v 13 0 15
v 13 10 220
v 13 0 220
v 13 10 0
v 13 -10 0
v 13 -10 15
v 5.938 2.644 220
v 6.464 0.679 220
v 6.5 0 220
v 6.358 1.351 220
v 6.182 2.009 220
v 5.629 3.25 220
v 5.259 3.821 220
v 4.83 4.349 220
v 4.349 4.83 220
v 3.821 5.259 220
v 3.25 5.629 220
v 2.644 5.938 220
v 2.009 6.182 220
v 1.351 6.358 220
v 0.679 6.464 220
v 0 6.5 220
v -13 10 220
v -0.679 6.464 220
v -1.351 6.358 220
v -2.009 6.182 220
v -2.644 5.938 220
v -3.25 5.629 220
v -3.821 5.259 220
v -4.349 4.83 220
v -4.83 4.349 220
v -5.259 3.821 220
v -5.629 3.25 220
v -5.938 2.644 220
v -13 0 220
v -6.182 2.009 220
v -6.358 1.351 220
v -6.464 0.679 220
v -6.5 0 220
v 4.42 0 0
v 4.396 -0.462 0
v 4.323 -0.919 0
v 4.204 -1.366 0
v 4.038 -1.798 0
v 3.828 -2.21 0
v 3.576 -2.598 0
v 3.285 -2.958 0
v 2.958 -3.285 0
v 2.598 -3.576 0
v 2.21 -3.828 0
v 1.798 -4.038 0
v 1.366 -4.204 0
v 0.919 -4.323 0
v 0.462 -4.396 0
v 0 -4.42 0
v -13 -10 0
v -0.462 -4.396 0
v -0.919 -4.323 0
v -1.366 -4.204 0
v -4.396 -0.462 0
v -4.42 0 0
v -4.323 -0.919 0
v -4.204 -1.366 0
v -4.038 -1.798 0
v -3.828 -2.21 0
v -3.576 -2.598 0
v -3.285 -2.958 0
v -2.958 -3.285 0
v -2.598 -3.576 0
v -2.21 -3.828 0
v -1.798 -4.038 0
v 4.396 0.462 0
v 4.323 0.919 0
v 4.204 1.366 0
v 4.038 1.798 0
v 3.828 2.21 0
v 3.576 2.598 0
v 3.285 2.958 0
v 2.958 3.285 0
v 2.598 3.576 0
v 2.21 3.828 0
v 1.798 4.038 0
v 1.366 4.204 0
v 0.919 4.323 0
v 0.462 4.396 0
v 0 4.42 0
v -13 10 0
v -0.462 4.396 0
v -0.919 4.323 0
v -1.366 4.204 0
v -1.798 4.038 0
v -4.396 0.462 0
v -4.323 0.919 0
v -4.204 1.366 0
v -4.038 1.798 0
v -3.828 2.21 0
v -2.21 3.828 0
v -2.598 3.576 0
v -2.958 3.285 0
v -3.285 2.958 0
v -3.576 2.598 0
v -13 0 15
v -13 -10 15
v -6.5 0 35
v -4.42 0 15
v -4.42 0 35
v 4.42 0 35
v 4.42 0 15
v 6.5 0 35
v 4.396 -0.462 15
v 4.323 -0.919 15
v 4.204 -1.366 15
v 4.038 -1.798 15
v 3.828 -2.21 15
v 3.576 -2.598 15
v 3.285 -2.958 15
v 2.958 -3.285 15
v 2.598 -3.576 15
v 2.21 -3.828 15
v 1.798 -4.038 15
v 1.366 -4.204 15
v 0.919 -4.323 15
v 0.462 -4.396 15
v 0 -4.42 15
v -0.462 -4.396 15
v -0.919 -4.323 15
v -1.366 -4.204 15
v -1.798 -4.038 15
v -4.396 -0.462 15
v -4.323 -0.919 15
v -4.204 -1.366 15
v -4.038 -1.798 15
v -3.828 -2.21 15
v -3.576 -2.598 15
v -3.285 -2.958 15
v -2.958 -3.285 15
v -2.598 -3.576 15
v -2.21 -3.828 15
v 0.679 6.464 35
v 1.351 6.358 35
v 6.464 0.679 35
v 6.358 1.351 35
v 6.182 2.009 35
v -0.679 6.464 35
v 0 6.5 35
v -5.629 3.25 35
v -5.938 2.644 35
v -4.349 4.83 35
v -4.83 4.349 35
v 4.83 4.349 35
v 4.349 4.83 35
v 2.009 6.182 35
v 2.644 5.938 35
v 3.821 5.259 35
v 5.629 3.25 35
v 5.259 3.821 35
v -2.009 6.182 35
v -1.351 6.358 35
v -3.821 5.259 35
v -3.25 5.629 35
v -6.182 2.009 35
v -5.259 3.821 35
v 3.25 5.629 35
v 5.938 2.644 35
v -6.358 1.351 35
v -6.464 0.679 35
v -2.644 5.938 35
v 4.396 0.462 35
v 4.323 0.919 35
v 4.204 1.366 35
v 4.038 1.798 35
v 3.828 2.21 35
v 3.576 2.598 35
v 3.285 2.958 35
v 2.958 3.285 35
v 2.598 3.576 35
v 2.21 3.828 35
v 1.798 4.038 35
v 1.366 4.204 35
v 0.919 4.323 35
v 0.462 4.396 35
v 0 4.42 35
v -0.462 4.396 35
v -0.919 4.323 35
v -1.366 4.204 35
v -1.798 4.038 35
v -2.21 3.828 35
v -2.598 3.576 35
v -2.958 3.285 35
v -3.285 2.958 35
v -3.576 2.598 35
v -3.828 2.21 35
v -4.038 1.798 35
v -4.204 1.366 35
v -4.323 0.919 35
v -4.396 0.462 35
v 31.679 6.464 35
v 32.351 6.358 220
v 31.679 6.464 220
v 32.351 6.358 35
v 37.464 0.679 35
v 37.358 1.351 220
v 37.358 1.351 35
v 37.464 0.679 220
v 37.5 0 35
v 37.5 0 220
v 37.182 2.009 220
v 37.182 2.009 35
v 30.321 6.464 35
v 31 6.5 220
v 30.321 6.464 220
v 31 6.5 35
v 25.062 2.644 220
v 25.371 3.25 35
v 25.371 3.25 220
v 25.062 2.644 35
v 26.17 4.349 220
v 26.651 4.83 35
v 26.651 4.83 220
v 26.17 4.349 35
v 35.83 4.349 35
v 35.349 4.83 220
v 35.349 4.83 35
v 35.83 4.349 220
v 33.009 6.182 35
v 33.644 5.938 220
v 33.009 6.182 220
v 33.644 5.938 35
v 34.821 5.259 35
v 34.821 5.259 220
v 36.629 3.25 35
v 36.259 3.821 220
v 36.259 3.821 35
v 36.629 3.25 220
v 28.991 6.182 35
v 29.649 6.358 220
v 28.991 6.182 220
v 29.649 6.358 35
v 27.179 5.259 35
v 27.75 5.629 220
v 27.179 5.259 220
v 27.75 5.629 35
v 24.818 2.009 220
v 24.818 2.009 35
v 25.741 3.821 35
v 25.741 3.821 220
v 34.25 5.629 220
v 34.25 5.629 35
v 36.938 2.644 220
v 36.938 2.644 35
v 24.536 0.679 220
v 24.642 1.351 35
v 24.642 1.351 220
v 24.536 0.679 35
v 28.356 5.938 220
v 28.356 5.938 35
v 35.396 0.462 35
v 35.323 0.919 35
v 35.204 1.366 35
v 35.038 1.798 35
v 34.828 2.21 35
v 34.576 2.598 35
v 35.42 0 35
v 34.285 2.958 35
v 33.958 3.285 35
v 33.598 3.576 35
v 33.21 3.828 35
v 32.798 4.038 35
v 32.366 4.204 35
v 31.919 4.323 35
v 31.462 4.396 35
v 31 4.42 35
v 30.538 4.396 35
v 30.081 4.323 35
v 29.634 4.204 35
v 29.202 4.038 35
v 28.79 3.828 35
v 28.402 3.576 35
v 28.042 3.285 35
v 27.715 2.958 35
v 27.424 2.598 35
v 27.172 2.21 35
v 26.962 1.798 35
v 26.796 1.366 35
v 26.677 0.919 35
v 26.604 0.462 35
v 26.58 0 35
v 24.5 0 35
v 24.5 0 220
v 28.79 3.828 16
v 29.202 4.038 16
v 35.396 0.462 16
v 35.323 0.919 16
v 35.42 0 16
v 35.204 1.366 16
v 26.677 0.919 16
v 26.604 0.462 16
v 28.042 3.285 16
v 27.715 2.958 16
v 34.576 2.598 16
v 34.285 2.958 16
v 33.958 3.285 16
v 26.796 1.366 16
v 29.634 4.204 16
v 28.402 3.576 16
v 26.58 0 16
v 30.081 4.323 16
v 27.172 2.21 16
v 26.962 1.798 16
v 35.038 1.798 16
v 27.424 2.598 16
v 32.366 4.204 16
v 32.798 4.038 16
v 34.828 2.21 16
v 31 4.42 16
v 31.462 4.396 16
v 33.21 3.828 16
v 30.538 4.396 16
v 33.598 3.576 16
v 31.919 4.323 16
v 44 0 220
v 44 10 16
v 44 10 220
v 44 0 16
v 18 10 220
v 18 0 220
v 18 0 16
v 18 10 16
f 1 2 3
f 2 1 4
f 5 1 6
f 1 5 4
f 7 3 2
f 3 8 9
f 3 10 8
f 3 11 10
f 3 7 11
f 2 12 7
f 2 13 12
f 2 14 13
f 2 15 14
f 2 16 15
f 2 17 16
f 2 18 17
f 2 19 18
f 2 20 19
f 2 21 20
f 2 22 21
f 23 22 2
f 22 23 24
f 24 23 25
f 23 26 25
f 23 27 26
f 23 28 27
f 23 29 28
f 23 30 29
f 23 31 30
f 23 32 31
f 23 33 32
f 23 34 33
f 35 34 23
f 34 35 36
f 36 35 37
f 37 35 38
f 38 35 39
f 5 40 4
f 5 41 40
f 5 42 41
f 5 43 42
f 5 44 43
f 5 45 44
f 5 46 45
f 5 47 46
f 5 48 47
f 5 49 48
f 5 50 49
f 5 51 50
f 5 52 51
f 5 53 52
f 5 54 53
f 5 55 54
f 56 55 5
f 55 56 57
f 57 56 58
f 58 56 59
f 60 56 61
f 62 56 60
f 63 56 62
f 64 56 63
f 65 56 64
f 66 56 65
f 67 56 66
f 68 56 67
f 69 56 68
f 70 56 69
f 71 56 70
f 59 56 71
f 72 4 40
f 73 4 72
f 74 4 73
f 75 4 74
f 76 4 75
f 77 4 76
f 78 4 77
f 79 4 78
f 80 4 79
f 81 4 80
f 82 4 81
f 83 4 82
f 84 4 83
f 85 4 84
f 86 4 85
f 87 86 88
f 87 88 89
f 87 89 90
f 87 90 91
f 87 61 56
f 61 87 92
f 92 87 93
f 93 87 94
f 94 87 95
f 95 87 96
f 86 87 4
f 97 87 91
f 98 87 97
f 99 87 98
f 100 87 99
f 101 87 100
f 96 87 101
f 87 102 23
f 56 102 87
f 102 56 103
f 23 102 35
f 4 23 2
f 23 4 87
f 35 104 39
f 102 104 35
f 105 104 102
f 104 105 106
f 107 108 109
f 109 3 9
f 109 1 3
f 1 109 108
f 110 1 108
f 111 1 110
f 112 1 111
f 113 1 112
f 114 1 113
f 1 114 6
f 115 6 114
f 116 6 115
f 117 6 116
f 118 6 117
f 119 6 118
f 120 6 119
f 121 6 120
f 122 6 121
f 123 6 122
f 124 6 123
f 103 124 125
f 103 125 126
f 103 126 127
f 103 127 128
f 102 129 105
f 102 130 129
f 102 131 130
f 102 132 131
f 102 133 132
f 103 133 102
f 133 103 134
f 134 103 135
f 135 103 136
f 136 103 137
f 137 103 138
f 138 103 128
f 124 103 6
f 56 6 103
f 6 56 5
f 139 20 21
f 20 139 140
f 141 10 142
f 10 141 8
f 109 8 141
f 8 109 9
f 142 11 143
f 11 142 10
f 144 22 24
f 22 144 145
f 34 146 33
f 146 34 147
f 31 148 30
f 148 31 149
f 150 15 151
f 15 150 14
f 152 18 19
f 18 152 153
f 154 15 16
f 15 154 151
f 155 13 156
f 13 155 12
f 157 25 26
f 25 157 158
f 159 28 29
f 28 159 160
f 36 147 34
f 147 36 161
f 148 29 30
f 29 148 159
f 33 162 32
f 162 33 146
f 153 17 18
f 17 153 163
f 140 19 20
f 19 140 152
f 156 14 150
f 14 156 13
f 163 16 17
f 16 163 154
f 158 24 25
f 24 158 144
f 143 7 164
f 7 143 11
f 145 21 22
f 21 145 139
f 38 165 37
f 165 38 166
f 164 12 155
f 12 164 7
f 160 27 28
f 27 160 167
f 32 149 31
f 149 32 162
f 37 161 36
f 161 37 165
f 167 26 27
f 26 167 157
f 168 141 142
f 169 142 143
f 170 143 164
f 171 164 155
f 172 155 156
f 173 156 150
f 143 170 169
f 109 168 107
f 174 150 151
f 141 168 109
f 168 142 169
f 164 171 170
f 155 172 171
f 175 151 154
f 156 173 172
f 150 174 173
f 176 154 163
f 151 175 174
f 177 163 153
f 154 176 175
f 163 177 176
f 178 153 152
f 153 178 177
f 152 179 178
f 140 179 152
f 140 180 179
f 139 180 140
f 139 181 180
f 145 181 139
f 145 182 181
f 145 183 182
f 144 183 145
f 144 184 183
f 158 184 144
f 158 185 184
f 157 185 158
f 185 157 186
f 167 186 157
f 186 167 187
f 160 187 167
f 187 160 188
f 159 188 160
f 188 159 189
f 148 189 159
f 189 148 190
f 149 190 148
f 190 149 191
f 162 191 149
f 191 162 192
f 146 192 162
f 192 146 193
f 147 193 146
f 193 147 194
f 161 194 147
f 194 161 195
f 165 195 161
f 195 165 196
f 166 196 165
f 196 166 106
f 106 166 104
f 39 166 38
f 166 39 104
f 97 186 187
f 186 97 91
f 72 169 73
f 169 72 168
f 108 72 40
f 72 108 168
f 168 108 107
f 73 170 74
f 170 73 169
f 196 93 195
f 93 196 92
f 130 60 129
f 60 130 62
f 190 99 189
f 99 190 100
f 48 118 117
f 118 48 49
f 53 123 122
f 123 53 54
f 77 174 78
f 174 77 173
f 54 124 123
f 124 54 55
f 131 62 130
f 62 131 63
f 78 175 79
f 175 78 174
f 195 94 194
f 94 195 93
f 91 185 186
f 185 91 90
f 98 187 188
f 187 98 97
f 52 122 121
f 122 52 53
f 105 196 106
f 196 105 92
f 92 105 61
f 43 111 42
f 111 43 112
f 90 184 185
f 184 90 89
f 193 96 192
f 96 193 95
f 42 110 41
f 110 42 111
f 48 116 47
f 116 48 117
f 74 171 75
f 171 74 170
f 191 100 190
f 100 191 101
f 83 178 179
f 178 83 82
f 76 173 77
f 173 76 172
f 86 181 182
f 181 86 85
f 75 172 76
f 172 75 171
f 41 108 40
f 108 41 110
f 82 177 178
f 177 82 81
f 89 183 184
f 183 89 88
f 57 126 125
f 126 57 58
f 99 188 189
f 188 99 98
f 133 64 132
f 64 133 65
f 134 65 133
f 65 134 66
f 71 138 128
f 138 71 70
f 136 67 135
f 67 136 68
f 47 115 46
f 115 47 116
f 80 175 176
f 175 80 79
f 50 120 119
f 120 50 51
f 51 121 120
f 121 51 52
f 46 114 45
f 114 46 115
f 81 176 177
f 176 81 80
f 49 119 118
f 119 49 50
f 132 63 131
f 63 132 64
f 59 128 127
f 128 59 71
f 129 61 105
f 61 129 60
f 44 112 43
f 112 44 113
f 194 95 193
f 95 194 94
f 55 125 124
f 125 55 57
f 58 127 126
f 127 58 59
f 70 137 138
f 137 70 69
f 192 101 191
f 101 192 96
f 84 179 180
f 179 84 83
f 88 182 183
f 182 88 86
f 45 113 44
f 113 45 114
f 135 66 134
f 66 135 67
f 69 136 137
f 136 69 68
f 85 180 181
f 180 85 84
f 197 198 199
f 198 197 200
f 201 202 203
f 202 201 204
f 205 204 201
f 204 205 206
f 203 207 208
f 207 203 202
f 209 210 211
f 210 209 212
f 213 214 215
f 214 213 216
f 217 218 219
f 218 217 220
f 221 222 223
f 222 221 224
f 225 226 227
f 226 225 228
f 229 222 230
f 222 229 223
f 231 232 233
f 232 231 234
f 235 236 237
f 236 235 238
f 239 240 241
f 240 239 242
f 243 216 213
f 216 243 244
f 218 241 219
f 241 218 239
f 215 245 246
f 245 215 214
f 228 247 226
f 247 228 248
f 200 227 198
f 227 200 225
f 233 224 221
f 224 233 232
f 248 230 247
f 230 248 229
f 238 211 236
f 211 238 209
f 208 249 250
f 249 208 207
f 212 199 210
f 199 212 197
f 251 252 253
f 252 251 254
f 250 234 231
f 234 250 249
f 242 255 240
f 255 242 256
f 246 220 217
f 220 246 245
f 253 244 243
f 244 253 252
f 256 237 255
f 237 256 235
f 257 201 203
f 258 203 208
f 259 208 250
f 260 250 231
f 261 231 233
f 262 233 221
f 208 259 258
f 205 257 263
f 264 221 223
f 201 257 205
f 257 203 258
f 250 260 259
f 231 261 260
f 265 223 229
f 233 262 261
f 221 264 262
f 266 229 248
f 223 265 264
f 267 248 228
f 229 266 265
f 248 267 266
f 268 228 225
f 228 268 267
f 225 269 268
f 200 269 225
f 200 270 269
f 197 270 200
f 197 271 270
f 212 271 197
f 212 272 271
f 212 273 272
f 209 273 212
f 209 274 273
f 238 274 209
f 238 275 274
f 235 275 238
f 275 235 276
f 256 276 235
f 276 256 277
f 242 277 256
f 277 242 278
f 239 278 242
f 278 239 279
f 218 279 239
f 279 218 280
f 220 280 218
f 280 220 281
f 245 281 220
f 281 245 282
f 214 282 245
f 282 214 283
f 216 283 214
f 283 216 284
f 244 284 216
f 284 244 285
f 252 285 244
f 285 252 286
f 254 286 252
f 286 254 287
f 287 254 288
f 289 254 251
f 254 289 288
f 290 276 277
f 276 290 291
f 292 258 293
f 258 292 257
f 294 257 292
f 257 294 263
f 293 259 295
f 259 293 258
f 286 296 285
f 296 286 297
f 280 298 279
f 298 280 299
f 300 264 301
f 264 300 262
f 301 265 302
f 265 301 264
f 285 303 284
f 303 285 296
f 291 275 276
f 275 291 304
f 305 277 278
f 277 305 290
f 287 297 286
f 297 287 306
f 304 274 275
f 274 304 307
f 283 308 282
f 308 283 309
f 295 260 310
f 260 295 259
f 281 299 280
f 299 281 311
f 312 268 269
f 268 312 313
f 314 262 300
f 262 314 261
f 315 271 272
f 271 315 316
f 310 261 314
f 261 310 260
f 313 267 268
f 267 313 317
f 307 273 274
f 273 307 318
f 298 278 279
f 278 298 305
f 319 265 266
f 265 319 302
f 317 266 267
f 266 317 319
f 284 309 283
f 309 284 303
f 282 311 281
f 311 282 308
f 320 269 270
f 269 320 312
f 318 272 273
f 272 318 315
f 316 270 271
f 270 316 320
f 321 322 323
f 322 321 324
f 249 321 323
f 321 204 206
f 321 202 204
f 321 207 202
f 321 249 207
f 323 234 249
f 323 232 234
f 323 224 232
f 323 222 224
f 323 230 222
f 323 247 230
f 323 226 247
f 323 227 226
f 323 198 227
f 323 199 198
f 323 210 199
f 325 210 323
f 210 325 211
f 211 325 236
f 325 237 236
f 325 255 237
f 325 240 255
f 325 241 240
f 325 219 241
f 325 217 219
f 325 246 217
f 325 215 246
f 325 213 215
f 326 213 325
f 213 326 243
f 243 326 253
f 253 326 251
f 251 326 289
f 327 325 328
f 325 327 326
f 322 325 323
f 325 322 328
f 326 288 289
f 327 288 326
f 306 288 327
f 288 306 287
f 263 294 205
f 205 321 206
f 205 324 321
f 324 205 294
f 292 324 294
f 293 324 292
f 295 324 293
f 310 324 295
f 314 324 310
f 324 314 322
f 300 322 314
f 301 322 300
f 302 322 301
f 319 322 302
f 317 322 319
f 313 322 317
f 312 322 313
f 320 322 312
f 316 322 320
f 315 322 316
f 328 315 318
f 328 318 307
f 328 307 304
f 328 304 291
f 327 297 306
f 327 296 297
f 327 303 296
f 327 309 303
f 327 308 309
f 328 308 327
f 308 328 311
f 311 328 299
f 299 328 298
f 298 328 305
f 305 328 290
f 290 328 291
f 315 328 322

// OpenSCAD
$fn = 60;

//intersection(){
//    translate([-150,0,0])
//  cube([300,300,300]);
//  moldTop();  
    
//}

//moldbase();
moldBottom();

translate ([MoldW+5,0,0])
moldTop();
//rods();
//rod();
//BRodCap();
//rndCyl (20,40,5);

// Radius and Height of mold casing
MoldR = 15; // For round vertical mold
MoldL = 20; // For cubic horizonatal mold; Based on the metal clamp width 
MoldW = 26; // For cubic horizonatal mold; Based on the metal clamp width 
MoldH = 200; // For round vertical mold

// Dimensions of cylinder tube to be molded
CylH = 190; // outer height
CylOR = 6.5; // outer radius
CylIR = 4.37; // internal radius
BotThk = 3; // bottom Thickness

// For fully printed central rod
// connecting rod to connect the two halved of the central rod
ConRodRad = 2;
ConRodH = 40;

// Caps if using brass tube as central rod
BRodOR = 4.42; // Outer radius
BRodIR = 3.98; // Inner radius

module BRodCap () {
    union(){
        difference(){
            translate([0,0,2*BRodOR])
            sphere(BRodOR);
            cube(4*BRodOR,center=true);
        }
        rndCyl(BRodIR,2.6*BRodOR,1.5);
    }
}

// Creates a cylinder radius R, height H with corners rounded with radius rndR
module rndCyl (R, H, rndR){
    translate([0,0,rndR])
    minkowski(){
        cylinder(r=R-rndR,h=H-2*rndR);
        sphere(rndR); 
    }
}
        
module moldbase(){
    difference(){
    union(){
        //cylinder(r=MoldR,h=MoldH+10);
        cylinder(r=MoldR*2,h=25);
    }
    
    translate([0,0,-0.5])
        cylinder(r=CylIR,h=30); // Hole for inner shell rod to sit in (radius 1 mm smaller than the rod)
    
    }
}
    
module moldBottom(){
    difference(){
        union(){
            //cylinder(r=MoldR,h=MoldH+10);
            //cylinder(r=MoldR*2,h=MoldH+10,r2=MoldR);
            
            translate([0, MoldL/4,(CylH+30)/2])
            cube([MoldW,MoldL/2,CylH+30],center=true);
            translate([0,0,7.5 ])
            cube([MoldW,MoldL,15],center=true);
        }
        
        translate([0,0,35])
        union(){
            cylinder(r=CylOR,h=CylH); // The outer shell
            translate([0,0,-40])
            cylinder(r=BRodOR,h=CylH-1.0); // Hole for Brass Rod
        }
    }
}

module moldTop(){
    difference(){
        difference(){
            //cylinder(r=MoldR,h=MoldH+10);
            //cylinder(r=MoldR*2,h=MoldH+10,r2=MoldR);
            
            translate([0, MoldL/4,(CylH+30)/2])
            cube([MoldW,MoldL/2,CylH+30],center=true);
            translate([0,0,7.5 ])
            cube([MoldW+0.5,MoldL+0.5,17],center=true);
        }
        
        translate([0,0,35])
        union(){
            cylinder(r=CylOR,h=CylH); // The outer shell
            translate([0,0,-40])
            cylinder(r=BRodOR,h=CylH-1.0); // Hole for Brass Rod
        }
    }
}

module rod (){
    translate([0,0,10])
    difference(){
        union(){
            translate([0,0,CylH-CylIR-BotThk])
                sphere(r=CylIR);
            cylinder(r=CylIR,h=CylH-CylIR-BotThk); 
            translate([0,0,-10+CylIR-1.25])
            cylinder(r=CylIR-1.25,h=CylH-11.0);
            translate([0,0,-10+CylIR-1.25])
            sphere (r=CylIR-1.25);
        }
        
        translate([0,0,(MoldH-ConRodH)/2])
        cylinder(r=ConRodRad, h=ConRodH);
    }
}

module rods(){
    translate ([7,0,(CylH+10-BotThk)/2])
    rotate([180,0,0])
    intersection(){
      cube([300,300,CylH+10-BotThk],center=true);
      rod();  
    }
    
    translate ([-7,0,(CylH+10-BotThk)/2])
    rotate([180,0,0])
    intersection(){
      cube([300,300,CylH+10-BotThk],center=true);
      translate([0,0,CylH+10-BotThk])
        rotate([180,0,0])  
            rod();  
    }
}
